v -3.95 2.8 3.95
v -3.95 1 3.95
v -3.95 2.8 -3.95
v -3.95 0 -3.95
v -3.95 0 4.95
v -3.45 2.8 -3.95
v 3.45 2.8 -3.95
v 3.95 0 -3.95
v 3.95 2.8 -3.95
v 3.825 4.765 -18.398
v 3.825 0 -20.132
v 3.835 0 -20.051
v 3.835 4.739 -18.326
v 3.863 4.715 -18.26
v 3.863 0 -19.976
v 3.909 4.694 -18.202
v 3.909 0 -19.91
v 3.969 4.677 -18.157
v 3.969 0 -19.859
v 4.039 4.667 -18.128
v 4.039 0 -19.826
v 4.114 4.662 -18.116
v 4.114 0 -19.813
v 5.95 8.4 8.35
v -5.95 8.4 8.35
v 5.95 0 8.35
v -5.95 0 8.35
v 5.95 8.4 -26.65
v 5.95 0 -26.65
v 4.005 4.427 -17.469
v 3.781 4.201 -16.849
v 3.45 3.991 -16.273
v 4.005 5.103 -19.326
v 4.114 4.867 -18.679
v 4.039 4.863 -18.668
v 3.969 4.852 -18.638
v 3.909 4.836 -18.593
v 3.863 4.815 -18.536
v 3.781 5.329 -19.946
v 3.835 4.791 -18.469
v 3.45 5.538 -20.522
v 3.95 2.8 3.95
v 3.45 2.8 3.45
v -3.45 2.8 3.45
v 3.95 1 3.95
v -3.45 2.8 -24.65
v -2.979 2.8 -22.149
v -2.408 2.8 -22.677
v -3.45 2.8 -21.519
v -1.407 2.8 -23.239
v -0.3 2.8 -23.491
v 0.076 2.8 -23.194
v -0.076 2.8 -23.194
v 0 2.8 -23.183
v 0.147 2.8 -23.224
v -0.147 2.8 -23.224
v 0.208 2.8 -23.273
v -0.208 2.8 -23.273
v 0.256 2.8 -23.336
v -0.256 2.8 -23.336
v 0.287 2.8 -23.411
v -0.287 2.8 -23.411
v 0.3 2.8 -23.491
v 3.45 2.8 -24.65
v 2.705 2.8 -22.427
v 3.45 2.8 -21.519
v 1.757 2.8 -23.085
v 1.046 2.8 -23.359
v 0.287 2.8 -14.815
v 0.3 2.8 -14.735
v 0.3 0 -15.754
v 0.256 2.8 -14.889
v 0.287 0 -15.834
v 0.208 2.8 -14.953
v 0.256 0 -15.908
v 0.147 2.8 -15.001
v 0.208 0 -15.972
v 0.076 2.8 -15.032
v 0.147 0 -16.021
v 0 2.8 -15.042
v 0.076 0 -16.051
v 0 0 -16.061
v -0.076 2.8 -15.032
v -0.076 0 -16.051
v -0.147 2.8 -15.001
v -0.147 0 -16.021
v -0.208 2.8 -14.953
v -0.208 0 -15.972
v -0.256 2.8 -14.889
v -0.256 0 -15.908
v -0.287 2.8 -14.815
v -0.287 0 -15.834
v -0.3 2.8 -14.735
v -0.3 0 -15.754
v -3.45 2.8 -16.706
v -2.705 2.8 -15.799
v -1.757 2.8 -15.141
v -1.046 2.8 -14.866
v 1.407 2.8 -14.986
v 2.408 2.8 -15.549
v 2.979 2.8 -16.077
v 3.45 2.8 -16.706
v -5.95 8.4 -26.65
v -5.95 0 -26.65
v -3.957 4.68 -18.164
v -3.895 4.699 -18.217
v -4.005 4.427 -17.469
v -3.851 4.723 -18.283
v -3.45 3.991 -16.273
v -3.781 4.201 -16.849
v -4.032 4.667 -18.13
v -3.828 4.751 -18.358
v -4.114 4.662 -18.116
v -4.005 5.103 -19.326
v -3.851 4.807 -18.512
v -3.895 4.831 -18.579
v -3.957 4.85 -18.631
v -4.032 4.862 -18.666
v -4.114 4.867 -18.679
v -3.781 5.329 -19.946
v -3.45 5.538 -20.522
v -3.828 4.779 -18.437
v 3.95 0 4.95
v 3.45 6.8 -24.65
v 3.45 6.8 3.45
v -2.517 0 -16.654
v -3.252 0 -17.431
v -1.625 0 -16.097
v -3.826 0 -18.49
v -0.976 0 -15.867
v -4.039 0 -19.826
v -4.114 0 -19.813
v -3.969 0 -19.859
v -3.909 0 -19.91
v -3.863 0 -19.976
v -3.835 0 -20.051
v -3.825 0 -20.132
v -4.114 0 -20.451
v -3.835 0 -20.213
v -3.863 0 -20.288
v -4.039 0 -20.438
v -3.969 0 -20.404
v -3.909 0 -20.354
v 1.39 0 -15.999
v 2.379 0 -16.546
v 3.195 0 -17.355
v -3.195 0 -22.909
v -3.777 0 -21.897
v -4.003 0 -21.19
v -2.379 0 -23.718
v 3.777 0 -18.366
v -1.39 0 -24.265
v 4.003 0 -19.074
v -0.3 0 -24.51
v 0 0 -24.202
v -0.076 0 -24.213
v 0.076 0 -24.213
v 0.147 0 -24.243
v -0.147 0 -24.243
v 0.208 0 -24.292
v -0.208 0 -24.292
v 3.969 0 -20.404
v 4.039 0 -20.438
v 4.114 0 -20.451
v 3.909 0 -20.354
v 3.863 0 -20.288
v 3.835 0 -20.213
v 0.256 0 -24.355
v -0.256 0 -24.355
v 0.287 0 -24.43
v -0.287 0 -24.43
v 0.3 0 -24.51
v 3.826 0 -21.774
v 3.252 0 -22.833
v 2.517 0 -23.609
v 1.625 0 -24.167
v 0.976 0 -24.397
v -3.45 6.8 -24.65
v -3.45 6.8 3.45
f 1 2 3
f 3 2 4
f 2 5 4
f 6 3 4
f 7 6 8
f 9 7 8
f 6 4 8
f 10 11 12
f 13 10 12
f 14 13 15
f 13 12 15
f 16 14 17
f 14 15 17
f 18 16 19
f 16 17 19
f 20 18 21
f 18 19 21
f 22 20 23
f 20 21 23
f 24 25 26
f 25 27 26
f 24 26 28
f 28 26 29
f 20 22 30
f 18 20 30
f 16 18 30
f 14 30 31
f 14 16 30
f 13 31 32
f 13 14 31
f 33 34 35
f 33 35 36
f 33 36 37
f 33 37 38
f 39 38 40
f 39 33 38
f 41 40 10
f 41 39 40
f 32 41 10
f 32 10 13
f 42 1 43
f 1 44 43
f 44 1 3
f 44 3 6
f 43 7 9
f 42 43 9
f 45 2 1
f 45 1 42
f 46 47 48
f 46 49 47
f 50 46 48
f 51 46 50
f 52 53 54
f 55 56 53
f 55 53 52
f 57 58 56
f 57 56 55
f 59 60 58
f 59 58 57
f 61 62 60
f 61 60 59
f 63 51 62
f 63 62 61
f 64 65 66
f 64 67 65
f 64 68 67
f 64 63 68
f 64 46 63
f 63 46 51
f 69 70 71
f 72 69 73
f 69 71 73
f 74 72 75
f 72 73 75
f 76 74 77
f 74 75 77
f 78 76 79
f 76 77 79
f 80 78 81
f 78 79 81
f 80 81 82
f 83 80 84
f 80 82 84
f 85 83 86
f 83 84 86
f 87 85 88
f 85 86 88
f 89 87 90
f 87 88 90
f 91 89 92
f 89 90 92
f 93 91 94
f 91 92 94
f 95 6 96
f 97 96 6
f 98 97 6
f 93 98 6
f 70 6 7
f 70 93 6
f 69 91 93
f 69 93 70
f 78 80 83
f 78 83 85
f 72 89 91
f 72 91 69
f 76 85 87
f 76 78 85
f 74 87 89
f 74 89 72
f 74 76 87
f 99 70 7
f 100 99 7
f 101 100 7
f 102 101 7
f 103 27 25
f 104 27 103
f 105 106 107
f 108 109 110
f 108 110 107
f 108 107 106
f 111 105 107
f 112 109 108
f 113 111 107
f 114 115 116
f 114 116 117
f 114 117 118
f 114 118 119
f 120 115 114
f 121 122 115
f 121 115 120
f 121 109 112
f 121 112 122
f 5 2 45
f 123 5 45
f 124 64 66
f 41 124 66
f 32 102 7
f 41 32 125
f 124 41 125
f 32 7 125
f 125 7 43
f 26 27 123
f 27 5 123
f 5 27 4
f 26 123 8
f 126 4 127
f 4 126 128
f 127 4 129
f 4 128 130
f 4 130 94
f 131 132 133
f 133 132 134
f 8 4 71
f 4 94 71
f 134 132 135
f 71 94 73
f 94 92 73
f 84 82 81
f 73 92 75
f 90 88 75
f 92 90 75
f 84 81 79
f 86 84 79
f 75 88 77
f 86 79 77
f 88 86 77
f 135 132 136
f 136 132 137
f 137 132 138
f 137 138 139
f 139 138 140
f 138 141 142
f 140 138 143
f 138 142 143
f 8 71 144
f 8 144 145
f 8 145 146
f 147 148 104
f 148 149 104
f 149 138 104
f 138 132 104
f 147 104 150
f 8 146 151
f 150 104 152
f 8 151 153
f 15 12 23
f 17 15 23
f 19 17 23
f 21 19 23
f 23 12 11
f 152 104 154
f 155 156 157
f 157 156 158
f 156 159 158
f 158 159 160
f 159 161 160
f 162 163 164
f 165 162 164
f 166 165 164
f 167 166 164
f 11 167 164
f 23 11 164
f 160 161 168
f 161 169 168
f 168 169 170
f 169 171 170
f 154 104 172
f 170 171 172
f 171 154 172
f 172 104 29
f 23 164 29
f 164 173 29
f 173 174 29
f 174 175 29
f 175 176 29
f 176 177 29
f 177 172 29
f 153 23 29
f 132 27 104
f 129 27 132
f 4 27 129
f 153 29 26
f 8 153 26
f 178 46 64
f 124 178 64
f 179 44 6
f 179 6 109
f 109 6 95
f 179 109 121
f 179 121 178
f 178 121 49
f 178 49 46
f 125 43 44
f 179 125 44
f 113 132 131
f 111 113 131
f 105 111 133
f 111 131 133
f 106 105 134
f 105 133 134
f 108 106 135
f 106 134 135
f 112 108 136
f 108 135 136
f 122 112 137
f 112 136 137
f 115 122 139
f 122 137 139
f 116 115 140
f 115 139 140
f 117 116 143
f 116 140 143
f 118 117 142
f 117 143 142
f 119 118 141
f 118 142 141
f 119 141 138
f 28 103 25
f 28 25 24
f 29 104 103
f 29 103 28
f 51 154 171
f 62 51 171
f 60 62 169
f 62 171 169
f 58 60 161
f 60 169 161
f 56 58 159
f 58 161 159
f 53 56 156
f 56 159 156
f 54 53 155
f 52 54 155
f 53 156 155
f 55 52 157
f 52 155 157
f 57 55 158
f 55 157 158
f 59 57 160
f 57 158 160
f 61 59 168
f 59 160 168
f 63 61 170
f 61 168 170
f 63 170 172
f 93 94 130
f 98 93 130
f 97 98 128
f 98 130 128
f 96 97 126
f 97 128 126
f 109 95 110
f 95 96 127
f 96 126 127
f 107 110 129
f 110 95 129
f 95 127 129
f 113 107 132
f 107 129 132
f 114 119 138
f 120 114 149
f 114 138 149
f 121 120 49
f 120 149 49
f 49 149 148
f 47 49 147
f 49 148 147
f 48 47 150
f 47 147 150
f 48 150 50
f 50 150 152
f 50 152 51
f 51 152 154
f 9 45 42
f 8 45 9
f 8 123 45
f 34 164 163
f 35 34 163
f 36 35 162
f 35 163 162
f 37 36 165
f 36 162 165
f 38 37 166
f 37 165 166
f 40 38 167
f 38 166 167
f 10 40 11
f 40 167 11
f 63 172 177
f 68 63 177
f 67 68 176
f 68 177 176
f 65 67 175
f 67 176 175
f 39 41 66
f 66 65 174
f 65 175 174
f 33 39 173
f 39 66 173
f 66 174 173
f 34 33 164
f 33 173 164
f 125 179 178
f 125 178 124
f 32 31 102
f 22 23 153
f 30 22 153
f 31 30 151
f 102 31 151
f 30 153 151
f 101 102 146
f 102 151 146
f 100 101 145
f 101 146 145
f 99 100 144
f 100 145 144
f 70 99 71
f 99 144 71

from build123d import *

# Parameters (mm, degrees)
SKETCH1_W           = 11.9
SKETCH1_H           = 35
SKETCH1_W_2         = 7.9
SKETCH1_H_2         = 7.9
BOSS_EXTRUDE1_DEPTH = 2.8
SKETCH2_W           = 11.9
SKETCH2_H           = 35
BOSS_EXTRUDE2_DEPTH = 4
SKETCH3_W           = 11.9
SKETCH3_H           = 35
BOSS_EXTRUDE3_DEPTH = 1.6
CUT_EXTRUDE1_DEPTH  = 7.3
CHAMFER1_SIZE       = 1


with BuildPart() as part:
    # Sketch1 → Boss-Extrude1 (new body)
    with BuildSketch(Plane(origin=(0, 0, 0), x_dir=(1, 0, 0), z_dir=(0, 1, 0))):
        with Locations((0, 9.15)):
            Rectangle(SKETCH1_W, SKETCH1_H)
        Rectangle(SKETCH1_W_2, SKETCH1_H_2, mode=Mode.SUBTRACT)
    extrude(amount=BOSS_EXTRUDE1_DEPTH)

    # Sketch2 → Boss-Extrude2 (add)
    with BuildSketch(Plane(origin=(0, 2.8, 0), x_dir=(1, 0, 0), z_dir=(0, 1, 0))):
        with Locations((0, 9.15)):
            Rectangle(SKETCH2_W, SKETCH2_H)
        Polygon((-3.95, 3.95), (-3.45, 3.95), (-3.45, 24.65), (3.45, 24.65), (3.45, 3.95), (3.95, 3.95), (3.95, -3.95), (-3.95, -3.95), align=None, mode=Mode.SUBTRACT)
        Polygon((3.45, -3.45), (-3.45, -3.45), (-3.45, 3.45), (-3.45, 3.95), (-3.95, 3.95), (-3.95, -3.95), (3.95, -3.95), (3.95, 3.95), (3.45, 3.95), (3.45, 3.45), align=None)
    extrude(amount=BOSS_EXTRUDE2_DEPTH)

    # Sketch3 → Boss-Extrude3 (add)
    with BuildSketch(Plane(origin=(0, 6.8, 0), x_dir=(1, 0, 0), z_dir=(0, 1, 0))):
        with Locations((0, 9.15)):
            Rectangle(SKETCH3_W, SKETCH3_H)
    extrude(amount=BOSS_EXTRUDE3_DEPTH)

    # Sketch4 → Cut-Extrude1 (cut)
    with BuildSketch(Plane(origin=(0, -8.565144899, -3.117457795), x_dir=(-1, 0, 0), z_dir=(0, -0.9396926207859081, -0.34202014332566943))):
        with BuildLine():
            ThreePointArc((4.114090909, 18.618006757), (3.825, 18.917808344), (4.114090909, 19.217609931))
            ThreePointArc((4.114090909, 19.217609931), (2.916815472, 21.834623816), (0.299801587, 23.031899253))
            ThreePointArc((0.299801587, 23.031899253), (0, 22.742808344), (-0.299801587, 23.031899253))
            ThreePointArc((-0.299801587, 23.031899253), (-2.916815472, 21.834623816), (-4.114090909, 19.217609931))
            ThreePointArc((-4.114090909, 19.217609931), (-3.909045459, 19.126047717), (-3.825, 18.917808344))
            ThreePointArc((-3.825, 18.917808344), (-3.909045459, 18.709568971), (-4.114090909, 18.618006757))
            ThreePointArc((-4.114090909, 18.618006757), (-2.916815472, 16.000992872), (-0.299801587, 14.803717435))
            ThreePointArc((-0.299801587, 14.803717435), (0, 15.092808344), (0.299801587, 14.803717435))
            ThreePointArc((0.299801587, 14.803717435), (2.916815472, 16.000992872), (4.114090909, 18.618006757))
        make_face()
    extrude(amount=-CUT_EXTRUDE1_DEPTH, mode=Mode.SUBTRACT)

    # Chamfer1
    chamfer1_edges = [part.edges().sort_by_distance(p)[0] for p in [
        (0, 0, 3.95),
    ]]
    chamfer(chamfer1_edges, length=CHAMFER1_SIZE)


solid = part.part
